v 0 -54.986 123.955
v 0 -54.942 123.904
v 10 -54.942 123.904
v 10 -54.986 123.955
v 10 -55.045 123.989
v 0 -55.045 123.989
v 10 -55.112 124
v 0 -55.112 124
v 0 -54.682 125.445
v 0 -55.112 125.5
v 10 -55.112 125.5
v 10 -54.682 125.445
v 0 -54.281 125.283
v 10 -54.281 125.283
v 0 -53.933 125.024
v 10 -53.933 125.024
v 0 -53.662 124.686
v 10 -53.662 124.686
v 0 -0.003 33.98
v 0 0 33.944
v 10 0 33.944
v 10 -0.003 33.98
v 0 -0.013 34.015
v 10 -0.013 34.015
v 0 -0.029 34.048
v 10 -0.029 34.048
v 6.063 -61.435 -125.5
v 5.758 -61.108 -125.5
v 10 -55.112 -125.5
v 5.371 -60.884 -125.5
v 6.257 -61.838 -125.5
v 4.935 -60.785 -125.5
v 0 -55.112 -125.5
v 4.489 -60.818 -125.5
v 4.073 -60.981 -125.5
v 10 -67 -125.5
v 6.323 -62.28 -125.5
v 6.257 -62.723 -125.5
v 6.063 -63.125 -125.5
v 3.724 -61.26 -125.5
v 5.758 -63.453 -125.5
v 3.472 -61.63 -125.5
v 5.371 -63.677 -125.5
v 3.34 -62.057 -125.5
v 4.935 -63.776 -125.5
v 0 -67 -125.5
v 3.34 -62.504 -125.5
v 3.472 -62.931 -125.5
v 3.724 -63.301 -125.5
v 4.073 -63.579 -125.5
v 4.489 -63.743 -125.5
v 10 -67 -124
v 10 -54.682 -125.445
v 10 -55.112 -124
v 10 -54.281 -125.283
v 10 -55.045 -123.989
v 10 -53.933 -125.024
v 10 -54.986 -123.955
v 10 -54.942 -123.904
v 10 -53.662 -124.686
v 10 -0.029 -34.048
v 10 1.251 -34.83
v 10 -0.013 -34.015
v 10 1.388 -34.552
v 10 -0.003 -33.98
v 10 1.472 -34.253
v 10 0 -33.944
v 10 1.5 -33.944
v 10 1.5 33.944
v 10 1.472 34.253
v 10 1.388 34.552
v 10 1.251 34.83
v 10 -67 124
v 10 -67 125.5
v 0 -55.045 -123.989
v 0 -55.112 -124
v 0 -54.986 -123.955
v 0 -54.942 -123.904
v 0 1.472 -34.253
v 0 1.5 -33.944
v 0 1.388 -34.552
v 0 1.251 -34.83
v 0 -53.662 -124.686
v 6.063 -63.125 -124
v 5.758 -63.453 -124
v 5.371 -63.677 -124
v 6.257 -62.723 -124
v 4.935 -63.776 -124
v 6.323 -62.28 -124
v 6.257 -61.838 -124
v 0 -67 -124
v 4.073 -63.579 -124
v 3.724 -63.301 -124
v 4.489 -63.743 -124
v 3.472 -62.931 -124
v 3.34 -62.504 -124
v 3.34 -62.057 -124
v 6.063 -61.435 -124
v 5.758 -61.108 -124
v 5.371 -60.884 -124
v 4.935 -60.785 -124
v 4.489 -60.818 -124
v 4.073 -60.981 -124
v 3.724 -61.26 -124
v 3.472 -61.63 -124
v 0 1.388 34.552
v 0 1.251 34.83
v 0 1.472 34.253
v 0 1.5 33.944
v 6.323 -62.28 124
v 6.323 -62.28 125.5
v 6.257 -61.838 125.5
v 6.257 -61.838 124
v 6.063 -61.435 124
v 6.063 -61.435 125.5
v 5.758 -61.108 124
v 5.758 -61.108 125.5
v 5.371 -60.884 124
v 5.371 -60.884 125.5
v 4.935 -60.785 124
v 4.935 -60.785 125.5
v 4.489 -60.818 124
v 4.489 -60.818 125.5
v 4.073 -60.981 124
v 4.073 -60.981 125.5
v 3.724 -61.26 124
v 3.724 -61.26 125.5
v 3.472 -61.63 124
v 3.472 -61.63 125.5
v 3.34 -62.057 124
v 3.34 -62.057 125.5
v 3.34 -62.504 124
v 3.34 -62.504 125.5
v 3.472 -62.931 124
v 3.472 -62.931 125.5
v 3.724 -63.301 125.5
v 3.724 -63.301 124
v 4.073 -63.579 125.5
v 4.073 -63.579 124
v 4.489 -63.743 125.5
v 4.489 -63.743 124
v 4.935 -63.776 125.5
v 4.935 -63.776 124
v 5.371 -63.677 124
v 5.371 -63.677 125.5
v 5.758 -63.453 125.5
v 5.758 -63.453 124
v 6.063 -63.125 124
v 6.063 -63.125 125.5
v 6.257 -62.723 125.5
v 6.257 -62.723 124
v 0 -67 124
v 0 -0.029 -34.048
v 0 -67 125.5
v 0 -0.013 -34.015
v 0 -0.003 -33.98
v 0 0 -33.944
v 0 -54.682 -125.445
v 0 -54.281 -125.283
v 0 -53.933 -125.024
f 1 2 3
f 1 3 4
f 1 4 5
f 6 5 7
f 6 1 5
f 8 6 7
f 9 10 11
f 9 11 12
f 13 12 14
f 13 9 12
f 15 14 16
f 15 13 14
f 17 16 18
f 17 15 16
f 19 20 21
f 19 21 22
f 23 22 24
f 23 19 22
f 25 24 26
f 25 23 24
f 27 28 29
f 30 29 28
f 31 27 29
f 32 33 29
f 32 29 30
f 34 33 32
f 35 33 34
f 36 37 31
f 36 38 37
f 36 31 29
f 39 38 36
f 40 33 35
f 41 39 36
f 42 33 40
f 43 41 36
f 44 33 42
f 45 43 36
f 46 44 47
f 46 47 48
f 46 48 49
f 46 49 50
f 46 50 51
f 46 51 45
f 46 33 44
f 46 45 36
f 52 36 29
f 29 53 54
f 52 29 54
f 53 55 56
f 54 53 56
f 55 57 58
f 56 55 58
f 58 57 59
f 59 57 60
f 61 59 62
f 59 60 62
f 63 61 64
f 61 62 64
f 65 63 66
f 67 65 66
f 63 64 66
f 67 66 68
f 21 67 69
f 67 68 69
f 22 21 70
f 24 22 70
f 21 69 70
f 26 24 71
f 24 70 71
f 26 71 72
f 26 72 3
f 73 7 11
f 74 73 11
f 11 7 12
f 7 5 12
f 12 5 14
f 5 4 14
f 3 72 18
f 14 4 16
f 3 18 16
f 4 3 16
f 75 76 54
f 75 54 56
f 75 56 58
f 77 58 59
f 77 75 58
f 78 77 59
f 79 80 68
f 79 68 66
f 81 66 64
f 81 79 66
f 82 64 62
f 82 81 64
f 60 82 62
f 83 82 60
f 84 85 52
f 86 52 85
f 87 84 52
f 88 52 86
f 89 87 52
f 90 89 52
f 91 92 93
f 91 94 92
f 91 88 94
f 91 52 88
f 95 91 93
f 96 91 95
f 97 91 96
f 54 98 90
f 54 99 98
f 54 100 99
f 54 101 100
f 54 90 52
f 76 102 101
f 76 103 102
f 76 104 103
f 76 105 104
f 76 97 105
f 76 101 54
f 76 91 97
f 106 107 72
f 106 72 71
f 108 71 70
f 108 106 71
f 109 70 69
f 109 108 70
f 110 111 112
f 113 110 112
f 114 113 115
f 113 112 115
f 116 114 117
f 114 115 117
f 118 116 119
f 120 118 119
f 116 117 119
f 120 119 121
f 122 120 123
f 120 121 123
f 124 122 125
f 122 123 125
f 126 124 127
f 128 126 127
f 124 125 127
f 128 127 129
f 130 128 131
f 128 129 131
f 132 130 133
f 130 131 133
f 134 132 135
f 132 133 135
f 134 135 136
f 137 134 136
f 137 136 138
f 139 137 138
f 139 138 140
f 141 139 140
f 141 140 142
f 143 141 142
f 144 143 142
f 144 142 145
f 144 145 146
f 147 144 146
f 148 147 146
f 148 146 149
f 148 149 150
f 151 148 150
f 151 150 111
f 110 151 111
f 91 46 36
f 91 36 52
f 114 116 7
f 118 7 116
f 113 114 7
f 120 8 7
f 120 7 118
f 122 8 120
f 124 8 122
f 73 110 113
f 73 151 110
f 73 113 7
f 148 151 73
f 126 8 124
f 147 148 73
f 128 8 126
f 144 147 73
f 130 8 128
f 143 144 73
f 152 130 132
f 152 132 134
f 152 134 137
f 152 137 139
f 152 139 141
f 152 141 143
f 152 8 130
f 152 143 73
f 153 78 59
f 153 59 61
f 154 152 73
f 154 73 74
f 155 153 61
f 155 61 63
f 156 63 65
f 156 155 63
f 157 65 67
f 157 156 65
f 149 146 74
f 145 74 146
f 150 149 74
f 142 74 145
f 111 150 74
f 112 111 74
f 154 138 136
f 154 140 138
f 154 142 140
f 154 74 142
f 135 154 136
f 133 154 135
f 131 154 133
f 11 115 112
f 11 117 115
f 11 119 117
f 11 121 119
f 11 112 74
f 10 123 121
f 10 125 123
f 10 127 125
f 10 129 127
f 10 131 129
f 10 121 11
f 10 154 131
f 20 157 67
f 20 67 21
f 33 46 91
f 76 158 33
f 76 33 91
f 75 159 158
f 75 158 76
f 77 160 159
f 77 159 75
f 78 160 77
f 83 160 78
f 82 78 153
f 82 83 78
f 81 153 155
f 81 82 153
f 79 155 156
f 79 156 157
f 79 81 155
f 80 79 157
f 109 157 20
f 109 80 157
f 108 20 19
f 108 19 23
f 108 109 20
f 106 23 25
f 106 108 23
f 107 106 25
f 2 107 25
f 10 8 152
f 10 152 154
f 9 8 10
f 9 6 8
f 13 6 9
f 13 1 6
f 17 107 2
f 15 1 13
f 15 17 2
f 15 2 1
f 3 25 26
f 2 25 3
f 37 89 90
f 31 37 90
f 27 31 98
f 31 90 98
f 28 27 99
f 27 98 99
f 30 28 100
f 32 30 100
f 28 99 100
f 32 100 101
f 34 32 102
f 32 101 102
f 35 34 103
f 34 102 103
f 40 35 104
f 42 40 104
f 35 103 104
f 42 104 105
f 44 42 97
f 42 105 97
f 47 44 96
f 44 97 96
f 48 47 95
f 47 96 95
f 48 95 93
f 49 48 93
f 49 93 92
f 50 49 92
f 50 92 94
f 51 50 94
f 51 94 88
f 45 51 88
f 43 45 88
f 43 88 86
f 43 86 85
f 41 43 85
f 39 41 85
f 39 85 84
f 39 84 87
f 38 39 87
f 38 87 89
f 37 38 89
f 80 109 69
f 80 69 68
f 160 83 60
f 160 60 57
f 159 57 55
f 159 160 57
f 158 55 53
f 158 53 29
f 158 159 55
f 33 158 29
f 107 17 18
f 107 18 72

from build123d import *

# Parameters (mm, degrees)
SM_BASE_FLANGE_1_DEPTH = 10
SKETCH_6_R             = 1.5
CUT_EXTRUDE_1_DEPTH    = 260.98076852


# Sheet-metal steps are written as plain solids
with BuildPart() as part:
    # Sketch 1 → 基体-法兰1 (new body)
    with BuildSketch(Plane(origin=(0, 0, 0), x_dir=(0, 0, -1), z_dir=(1, 0, 0))):
        with BuildLine():
            Line((124, -67), (124, -55.112166923))
            ThreePointArc((124, -55.112166923), (123.974439102, -55.014335437), (123.904290002, -54.941510557))
            Line((123.904290002, -54.941510557), (34.048016854, -0.029343633))
            ThreePointArc((34.048016854, -0.029343633), (33.997896617, -0.007475621), (33.943726853, 0))
            Line((33.943726853, 0), (-33.943726853, 0))
            ThreePointArc((-33.943726853, 0), (-33.997896617, -0.007475621), (-34.048016854, -0.029343633))
            Line((-34.048016854, -0.029343633), (-123.904290002, -54.941510557))
            ThreePointArc((-123.904290002, -54.941510557), (-123.974439102, -55.014335437), (-124, -55.112166923))
            Line((-124, -55.112166923), (-124, -67))
            Line((-124, -67), (-125.5, -67))
            Line((-125.5, -67), (-125.5, -55.112166923))
            ThreePointArc((-125.5, -55.112166923), (-125.282732364, -54.280599285), (-124.686465016, -53.661587806))
            Line((-124.686465016, -53.661587806), (-34.830191869, 1.250579117))
            ThreePointArc((-34.830191869, 1.250579117), (-34.404169846, 1.436457225), (-33.943726853, 1.5))
            Line((-33.943726853, 1.5), (33.943726853, 1.5))
            ThreePointArc((33.943726853, 1.5), (34.404169846, 1.436457225), (34.830191869, 1.250579117))
            Line((34.830191869, 1.250579117), (124.686465016, -53.661587806))
            ThreePointArc((124.686465016, -53.661587806), (125.282732364, -54.280599286), (125.5, -55.112166924))
            Line((125.5, -55.112166923), (125.5, -67))
            Line((125.5, -67), (124, -67))
        make_face()
    extrude(amount=SM_BASE_FLANGE_1_DEPTH)

    # 草图6 → 切除-拉伸1 (cut, through all)
    with BuildSketch(Plane.XY.offset(125.5)):
        with Locations((4.823171357, -62.280383367)):
            Circle(SKETCH_6_R)
    extrude(amount=-CUT_EXTRUDE_1_DEPTH, mode=Mode.SUBTRACT)


solid = part.part
